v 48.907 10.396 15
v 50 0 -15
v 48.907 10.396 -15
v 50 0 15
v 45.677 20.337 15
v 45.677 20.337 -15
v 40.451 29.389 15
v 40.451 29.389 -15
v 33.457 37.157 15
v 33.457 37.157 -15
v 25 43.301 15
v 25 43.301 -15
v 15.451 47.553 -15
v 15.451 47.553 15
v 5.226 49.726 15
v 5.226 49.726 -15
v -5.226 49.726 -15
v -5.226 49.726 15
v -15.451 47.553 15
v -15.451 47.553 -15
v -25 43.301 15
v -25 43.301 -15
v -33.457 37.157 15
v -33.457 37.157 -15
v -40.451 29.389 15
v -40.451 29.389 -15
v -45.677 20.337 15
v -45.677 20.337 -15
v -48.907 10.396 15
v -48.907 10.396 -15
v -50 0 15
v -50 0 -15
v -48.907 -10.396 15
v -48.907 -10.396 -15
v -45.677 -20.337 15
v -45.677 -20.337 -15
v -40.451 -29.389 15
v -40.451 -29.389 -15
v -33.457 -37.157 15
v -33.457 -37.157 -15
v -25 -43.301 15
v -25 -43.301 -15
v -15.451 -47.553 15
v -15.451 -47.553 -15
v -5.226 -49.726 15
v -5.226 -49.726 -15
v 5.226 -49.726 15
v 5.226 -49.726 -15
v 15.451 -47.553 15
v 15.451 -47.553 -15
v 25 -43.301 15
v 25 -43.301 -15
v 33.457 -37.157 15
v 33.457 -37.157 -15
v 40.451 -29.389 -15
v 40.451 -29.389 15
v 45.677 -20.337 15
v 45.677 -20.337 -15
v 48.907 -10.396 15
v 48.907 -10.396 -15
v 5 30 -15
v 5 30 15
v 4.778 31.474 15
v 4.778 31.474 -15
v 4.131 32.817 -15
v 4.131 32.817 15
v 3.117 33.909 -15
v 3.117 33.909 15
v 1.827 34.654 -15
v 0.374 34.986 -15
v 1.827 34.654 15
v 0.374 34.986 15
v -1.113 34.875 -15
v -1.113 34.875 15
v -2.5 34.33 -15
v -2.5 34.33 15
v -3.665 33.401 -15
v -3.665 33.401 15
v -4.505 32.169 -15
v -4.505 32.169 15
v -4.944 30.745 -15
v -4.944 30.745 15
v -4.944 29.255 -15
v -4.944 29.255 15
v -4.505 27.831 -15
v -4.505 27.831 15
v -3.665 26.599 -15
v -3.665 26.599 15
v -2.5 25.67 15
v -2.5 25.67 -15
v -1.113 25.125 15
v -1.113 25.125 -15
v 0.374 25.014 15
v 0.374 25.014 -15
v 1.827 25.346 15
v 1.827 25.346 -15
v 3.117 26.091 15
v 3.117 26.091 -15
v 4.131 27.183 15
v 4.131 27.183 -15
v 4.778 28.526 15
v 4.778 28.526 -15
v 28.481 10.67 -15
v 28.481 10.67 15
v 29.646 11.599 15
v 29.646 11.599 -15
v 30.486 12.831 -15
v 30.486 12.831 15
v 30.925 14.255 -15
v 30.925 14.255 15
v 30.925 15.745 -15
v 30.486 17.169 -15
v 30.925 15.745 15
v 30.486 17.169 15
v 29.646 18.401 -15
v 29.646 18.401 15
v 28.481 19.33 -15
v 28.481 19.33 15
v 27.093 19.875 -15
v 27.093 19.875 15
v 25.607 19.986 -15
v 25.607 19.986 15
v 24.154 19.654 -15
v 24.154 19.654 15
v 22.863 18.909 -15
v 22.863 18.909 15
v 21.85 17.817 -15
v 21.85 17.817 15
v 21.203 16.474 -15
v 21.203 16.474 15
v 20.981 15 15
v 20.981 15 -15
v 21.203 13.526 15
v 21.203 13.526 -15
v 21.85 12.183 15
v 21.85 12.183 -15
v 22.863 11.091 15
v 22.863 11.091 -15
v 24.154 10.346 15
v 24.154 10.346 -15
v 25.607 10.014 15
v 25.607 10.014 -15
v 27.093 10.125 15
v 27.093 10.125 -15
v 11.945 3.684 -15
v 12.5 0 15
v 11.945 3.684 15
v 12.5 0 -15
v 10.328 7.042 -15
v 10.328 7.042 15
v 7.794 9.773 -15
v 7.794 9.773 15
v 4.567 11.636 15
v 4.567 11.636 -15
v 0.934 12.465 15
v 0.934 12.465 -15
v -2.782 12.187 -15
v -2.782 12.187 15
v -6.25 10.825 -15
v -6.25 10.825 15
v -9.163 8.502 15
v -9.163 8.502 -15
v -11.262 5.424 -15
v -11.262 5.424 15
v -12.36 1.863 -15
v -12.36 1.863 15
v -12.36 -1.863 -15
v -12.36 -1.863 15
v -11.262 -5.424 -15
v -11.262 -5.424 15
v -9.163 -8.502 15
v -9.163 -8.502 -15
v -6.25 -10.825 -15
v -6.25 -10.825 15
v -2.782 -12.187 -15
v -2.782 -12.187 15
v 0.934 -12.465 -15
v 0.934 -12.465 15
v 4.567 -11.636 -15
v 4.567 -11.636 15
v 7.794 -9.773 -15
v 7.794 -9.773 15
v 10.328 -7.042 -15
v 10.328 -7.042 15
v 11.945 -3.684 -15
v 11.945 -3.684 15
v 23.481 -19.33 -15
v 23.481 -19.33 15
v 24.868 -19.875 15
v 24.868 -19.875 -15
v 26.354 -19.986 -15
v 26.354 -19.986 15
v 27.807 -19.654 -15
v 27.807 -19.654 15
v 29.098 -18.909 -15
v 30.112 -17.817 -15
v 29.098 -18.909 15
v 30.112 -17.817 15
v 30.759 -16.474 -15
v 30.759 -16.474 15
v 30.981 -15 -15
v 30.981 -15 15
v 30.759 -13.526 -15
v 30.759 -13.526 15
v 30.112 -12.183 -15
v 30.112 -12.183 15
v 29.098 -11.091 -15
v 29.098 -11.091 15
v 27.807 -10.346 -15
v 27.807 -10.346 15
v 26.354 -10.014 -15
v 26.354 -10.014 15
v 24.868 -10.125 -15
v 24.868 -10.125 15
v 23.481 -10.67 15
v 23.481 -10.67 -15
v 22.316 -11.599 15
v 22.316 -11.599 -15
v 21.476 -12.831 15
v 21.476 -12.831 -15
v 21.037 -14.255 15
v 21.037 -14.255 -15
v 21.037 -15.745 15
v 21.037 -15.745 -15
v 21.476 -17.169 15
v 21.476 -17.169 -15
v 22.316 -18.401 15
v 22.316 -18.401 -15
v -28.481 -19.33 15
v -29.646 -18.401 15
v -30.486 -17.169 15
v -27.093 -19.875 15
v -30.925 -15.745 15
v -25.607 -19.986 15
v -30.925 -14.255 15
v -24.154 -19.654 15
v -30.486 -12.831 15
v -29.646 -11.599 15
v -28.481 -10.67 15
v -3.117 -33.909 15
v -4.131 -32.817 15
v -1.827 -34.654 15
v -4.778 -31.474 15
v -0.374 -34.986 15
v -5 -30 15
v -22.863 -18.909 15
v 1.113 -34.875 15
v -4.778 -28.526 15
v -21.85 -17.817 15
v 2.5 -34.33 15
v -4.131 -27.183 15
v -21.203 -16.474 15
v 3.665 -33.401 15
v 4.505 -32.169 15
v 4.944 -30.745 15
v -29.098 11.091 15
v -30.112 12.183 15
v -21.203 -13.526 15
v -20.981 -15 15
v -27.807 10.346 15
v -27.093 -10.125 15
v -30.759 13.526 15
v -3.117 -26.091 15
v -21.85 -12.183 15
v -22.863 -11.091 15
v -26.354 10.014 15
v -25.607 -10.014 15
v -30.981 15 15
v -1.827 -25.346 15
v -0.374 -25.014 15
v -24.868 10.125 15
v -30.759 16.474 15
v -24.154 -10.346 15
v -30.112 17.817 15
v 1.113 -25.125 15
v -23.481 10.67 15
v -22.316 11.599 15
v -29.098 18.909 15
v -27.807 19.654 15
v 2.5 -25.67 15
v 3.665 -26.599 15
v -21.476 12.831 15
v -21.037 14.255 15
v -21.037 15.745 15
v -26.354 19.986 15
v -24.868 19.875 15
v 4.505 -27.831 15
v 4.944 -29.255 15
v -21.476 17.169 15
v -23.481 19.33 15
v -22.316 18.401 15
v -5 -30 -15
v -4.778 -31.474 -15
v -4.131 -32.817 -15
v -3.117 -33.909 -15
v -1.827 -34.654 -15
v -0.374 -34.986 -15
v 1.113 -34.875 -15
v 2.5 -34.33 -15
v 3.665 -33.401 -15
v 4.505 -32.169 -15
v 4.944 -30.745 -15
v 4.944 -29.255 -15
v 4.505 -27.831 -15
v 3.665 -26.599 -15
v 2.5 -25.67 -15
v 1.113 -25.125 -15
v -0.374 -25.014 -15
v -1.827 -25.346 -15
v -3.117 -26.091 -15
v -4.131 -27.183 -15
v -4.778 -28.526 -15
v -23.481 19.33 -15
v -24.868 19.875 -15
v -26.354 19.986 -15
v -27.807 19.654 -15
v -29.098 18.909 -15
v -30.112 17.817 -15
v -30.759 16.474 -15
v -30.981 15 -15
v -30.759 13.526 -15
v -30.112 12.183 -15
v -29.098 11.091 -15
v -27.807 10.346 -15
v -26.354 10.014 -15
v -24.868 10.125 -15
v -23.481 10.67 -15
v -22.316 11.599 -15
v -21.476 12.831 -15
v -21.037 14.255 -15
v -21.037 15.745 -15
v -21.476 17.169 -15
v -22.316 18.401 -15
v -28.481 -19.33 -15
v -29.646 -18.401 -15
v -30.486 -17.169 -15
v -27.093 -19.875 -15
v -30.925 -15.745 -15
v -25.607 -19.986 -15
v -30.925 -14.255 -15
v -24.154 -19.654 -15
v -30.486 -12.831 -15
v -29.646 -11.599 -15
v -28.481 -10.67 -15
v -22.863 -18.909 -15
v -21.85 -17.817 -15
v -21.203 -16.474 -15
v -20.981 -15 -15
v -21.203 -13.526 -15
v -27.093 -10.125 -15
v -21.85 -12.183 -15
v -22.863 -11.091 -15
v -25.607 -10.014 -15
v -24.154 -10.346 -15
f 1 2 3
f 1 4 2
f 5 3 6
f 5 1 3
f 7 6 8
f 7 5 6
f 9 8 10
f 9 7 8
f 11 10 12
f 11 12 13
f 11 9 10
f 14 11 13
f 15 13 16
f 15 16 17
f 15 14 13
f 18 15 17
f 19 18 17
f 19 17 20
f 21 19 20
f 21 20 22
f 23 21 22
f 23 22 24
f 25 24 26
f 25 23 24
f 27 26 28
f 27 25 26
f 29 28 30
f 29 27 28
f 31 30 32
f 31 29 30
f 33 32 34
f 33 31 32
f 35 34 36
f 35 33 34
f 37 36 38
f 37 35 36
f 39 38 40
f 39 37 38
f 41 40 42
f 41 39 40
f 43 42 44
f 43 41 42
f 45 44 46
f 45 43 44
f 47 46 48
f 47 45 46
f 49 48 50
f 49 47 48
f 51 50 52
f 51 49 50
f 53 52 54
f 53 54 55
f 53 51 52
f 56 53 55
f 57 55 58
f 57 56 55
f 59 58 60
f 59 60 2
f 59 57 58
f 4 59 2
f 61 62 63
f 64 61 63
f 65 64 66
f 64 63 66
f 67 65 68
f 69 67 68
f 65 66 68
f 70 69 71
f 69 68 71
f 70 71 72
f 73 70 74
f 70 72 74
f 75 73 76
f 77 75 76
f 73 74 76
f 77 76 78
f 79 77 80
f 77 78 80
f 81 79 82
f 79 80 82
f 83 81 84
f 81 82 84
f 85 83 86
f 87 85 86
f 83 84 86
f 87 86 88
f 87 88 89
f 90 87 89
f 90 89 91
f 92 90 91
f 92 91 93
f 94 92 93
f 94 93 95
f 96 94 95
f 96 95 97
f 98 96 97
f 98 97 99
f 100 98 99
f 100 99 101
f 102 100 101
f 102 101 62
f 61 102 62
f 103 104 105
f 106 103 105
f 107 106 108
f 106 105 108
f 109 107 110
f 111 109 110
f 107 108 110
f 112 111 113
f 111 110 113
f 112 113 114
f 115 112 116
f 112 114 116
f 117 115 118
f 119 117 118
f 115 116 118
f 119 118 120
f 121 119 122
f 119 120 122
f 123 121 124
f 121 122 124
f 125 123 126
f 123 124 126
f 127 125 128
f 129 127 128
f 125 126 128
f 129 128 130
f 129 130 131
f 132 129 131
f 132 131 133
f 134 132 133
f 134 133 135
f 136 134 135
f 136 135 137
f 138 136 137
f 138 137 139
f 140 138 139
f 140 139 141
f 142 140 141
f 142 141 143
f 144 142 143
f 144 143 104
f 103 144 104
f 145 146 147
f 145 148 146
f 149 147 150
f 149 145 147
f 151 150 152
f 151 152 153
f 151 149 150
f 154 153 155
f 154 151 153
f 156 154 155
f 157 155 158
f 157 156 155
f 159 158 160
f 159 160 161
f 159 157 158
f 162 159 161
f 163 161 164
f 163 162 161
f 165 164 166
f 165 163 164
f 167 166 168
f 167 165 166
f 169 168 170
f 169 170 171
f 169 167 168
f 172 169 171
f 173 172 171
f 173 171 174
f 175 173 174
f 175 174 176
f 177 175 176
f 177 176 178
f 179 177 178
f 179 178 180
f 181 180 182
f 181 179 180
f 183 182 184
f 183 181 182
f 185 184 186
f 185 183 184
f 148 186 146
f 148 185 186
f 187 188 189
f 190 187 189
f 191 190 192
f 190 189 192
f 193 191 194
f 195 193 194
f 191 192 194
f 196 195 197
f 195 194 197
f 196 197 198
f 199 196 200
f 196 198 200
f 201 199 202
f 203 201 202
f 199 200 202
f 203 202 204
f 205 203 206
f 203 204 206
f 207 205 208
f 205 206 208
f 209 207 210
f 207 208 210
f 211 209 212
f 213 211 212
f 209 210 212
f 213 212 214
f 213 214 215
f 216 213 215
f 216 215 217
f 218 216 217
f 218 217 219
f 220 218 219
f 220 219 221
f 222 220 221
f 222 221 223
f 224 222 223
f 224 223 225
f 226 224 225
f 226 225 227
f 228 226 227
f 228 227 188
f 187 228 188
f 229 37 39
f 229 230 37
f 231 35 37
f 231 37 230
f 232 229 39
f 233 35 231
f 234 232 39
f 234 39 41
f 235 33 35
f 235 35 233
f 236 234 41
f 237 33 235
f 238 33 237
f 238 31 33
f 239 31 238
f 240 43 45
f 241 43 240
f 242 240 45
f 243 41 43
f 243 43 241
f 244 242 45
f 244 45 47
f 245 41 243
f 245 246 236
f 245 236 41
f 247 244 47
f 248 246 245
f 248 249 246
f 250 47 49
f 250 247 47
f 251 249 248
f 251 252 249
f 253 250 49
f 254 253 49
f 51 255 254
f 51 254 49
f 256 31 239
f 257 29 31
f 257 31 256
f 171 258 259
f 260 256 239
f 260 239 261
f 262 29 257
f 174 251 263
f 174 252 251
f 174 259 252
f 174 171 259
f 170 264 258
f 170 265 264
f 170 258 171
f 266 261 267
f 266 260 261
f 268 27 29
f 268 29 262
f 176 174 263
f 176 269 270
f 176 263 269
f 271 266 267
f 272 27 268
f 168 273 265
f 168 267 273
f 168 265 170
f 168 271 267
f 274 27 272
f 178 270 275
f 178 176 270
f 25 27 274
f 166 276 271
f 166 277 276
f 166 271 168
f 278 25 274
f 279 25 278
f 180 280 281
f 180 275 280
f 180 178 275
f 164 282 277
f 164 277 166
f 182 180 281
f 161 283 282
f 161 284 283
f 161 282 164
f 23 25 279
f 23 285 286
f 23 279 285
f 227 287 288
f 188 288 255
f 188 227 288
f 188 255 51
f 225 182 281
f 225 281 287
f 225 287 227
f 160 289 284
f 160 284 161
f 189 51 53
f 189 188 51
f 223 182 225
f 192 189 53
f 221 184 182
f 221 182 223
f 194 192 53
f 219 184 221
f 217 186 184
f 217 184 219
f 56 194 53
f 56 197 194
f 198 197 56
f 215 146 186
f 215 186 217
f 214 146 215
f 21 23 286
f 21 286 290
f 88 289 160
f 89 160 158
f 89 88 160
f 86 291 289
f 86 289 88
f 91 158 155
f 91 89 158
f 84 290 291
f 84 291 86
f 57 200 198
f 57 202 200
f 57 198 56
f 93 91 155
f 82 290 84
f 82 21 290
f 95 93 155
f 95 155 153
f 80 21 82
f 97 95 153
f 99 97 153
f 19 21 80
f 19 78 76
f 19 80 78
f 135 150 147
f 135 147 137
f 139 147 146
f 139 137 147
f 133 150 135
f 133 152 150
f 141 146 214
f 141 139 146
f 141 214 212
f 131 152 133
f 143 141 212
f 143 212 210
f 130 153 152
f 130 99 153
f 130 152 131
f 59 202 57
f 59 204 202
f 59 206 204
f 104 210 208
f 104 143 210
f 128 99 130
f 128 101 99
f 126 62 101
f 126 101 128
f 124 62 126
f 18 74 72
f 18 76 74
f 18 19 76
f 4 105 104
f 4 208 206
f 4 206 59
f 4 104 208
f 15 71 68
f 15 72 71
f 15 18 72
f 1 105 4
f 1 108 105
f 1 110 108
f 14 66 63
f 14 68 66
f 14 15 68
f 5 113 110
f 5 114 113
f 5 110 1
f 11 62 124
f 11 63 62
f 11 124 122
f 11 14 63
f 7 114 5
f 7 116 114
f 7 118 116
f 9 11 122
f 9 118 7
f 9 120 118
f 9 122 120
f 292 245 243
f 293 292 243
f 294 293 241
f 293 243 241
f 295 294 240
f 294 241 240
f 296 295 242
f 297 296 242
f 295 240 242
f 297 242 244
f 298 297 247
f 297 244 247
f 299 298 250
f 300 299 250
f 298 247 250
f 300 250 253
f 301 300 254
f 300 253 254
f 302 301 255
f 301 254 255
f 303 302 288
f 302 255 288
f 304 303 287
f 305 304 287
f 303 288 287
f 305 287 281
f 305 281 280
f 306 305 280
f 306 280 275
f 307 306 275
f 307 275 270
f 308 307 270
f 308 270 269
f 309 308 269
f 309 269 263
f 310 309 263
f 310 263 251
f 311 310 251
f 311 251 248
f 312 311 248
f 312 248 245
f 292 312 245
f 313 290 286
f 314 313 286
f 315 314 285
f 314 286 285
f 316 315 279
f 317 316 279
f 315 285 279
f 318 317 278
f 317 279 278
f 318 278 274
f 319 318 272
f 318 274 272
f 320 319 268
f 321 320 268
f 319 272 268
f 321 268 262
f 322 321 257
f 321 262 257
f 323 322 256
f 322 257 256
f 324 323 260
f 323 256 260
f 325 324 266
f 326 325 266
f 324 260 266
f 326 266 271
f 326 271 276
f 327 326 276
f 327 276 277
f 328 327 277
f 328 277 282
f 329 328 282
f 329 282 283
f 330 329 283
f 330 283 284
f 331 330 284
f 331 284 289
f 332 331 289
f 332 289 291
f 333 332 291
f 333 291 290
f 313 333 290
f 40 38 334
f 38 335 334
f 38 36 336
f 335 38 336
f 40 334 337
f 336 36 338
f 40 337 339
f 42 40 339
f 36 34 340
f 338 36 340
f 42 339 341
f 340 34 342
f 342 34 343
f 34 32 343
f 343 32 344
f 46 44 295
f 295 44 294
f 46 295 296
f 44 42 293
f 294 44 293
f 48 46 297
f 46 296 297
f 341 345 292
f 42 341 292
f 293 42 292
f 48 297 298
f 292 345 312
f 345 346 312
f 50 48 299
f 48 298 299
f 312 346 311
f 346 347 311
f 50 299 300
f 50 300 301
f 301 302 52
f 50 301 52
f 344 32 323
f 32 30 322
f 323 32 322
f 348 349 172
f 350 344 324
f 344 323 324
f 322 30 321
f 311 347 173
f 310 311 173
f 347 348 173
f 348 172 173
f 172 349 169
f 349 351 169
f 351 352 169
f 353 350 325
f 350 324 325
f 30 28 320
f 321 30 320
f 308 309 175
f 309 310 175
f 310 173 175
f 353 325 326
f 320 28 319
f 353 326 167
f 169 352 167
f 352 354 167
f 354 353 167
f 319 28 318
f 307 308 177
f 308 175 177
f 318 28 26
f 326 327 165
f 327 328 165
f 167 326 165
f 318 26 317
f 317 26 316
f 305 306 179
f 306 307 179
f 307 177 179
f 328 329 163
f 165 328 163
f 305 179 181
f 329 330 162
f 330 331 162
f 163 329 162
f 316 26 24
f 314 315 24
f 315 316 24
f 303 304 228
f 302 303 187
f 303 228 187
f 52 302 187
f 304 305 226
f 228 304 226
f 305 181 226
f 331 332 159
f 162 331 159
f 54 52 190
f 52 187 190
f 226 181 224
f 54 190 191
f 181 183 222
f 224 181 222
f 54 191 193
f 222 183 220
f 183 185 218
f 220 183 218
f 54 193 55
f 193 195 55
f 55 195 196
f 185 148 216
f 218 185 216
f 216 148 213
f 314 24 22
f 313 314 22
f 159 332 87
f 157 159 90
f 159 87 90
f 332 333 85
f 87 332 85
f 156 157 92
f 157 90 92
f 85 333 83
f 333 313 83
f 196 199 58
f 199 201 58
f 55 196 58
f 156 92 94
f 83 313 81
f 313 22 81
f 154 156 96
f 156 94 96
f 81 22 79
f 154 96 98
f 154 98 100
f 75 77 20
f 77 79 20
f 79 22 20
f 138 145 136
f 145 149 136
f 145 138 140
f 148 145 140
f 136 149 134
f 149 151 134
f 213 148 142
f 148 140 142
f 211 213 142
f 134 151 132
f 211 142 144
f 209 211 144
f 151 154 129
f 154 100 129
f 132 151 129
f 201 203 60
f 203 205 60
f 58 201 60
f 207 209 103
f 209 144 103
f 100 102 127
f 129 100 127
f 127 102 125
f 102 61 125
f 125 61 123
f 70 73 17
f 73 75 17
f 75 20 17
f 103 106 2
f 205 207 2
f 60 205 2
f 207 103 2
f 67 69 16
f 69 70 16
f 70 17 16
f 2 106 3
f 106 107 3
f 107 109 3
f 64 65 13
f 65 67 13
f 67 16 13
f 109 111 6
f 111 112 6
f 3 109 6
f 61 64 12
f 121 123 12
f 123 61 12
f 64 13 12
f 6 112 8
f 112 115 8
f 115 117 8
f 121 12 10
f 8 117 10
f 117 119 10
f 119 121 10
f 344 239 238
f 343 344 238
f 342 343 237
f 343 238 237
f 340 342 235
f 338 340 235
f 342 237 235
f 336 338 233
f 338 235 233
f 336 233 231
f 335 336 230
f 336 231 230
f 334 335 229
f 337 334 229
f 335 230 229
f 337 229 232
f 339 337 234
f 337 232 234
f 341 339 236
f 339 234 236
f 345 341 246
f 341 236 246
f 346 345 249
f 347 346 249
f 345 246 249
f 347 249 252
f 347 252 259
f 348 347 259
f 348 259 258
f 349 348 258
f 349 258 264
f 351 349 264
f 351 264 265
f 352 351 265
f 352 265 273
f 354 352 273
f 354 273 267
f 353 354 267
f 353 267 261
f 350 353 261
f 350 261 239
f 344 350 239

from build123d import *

# Parameters (mm, degrees)
SKETCH2_R           = 50
SKETCH2_R_2         = 12.5
BOSS_EXTRUDE1_DEPTH = 15
SKETCH6_R           = 5
CUT_EXTRUDE2_DEPTH  = 77.811457479
CIRPATTERN2_COUNT   = 6


with BuildPart() as part:
    # Sketch2 → Boss-Extrude1 (new, symmetric)
    with BuildSketch(Plane.XY):
        Circle(SKETCH2_R)
        Circle(SKETCH2_R_2, mode=Mode.SUBTRACT)
    extrude(amount=BOSS_EXTRUDE1_DEPTH, both=True)

    # Sketch6 → Cut-Extrude2 (cut, through all)
    with BuildSketch(Plane.XY.offset(15)):
        with Locations((0, 30)):
            Circle(SKETCH6_R)
    cut_extrude2 = extrude(amount=-CUT_EXTRUDE2_DEPTH, mode=Mode.SUBTRACT)

    # CirPattern2: Cut-Extrude2 ×6 about axis
    cirpattern2_axis = Axis((0, 0, 0), (0, 0, 1))
    for i in range(1, CIRPATTERN2_COUNT):
        add(cut_extrude2.rotate(cirpattern2_axis, i * 360 / CIRPATTERN2_COUNT), mode=Mode.SUBTRACT)


solid = part.part
